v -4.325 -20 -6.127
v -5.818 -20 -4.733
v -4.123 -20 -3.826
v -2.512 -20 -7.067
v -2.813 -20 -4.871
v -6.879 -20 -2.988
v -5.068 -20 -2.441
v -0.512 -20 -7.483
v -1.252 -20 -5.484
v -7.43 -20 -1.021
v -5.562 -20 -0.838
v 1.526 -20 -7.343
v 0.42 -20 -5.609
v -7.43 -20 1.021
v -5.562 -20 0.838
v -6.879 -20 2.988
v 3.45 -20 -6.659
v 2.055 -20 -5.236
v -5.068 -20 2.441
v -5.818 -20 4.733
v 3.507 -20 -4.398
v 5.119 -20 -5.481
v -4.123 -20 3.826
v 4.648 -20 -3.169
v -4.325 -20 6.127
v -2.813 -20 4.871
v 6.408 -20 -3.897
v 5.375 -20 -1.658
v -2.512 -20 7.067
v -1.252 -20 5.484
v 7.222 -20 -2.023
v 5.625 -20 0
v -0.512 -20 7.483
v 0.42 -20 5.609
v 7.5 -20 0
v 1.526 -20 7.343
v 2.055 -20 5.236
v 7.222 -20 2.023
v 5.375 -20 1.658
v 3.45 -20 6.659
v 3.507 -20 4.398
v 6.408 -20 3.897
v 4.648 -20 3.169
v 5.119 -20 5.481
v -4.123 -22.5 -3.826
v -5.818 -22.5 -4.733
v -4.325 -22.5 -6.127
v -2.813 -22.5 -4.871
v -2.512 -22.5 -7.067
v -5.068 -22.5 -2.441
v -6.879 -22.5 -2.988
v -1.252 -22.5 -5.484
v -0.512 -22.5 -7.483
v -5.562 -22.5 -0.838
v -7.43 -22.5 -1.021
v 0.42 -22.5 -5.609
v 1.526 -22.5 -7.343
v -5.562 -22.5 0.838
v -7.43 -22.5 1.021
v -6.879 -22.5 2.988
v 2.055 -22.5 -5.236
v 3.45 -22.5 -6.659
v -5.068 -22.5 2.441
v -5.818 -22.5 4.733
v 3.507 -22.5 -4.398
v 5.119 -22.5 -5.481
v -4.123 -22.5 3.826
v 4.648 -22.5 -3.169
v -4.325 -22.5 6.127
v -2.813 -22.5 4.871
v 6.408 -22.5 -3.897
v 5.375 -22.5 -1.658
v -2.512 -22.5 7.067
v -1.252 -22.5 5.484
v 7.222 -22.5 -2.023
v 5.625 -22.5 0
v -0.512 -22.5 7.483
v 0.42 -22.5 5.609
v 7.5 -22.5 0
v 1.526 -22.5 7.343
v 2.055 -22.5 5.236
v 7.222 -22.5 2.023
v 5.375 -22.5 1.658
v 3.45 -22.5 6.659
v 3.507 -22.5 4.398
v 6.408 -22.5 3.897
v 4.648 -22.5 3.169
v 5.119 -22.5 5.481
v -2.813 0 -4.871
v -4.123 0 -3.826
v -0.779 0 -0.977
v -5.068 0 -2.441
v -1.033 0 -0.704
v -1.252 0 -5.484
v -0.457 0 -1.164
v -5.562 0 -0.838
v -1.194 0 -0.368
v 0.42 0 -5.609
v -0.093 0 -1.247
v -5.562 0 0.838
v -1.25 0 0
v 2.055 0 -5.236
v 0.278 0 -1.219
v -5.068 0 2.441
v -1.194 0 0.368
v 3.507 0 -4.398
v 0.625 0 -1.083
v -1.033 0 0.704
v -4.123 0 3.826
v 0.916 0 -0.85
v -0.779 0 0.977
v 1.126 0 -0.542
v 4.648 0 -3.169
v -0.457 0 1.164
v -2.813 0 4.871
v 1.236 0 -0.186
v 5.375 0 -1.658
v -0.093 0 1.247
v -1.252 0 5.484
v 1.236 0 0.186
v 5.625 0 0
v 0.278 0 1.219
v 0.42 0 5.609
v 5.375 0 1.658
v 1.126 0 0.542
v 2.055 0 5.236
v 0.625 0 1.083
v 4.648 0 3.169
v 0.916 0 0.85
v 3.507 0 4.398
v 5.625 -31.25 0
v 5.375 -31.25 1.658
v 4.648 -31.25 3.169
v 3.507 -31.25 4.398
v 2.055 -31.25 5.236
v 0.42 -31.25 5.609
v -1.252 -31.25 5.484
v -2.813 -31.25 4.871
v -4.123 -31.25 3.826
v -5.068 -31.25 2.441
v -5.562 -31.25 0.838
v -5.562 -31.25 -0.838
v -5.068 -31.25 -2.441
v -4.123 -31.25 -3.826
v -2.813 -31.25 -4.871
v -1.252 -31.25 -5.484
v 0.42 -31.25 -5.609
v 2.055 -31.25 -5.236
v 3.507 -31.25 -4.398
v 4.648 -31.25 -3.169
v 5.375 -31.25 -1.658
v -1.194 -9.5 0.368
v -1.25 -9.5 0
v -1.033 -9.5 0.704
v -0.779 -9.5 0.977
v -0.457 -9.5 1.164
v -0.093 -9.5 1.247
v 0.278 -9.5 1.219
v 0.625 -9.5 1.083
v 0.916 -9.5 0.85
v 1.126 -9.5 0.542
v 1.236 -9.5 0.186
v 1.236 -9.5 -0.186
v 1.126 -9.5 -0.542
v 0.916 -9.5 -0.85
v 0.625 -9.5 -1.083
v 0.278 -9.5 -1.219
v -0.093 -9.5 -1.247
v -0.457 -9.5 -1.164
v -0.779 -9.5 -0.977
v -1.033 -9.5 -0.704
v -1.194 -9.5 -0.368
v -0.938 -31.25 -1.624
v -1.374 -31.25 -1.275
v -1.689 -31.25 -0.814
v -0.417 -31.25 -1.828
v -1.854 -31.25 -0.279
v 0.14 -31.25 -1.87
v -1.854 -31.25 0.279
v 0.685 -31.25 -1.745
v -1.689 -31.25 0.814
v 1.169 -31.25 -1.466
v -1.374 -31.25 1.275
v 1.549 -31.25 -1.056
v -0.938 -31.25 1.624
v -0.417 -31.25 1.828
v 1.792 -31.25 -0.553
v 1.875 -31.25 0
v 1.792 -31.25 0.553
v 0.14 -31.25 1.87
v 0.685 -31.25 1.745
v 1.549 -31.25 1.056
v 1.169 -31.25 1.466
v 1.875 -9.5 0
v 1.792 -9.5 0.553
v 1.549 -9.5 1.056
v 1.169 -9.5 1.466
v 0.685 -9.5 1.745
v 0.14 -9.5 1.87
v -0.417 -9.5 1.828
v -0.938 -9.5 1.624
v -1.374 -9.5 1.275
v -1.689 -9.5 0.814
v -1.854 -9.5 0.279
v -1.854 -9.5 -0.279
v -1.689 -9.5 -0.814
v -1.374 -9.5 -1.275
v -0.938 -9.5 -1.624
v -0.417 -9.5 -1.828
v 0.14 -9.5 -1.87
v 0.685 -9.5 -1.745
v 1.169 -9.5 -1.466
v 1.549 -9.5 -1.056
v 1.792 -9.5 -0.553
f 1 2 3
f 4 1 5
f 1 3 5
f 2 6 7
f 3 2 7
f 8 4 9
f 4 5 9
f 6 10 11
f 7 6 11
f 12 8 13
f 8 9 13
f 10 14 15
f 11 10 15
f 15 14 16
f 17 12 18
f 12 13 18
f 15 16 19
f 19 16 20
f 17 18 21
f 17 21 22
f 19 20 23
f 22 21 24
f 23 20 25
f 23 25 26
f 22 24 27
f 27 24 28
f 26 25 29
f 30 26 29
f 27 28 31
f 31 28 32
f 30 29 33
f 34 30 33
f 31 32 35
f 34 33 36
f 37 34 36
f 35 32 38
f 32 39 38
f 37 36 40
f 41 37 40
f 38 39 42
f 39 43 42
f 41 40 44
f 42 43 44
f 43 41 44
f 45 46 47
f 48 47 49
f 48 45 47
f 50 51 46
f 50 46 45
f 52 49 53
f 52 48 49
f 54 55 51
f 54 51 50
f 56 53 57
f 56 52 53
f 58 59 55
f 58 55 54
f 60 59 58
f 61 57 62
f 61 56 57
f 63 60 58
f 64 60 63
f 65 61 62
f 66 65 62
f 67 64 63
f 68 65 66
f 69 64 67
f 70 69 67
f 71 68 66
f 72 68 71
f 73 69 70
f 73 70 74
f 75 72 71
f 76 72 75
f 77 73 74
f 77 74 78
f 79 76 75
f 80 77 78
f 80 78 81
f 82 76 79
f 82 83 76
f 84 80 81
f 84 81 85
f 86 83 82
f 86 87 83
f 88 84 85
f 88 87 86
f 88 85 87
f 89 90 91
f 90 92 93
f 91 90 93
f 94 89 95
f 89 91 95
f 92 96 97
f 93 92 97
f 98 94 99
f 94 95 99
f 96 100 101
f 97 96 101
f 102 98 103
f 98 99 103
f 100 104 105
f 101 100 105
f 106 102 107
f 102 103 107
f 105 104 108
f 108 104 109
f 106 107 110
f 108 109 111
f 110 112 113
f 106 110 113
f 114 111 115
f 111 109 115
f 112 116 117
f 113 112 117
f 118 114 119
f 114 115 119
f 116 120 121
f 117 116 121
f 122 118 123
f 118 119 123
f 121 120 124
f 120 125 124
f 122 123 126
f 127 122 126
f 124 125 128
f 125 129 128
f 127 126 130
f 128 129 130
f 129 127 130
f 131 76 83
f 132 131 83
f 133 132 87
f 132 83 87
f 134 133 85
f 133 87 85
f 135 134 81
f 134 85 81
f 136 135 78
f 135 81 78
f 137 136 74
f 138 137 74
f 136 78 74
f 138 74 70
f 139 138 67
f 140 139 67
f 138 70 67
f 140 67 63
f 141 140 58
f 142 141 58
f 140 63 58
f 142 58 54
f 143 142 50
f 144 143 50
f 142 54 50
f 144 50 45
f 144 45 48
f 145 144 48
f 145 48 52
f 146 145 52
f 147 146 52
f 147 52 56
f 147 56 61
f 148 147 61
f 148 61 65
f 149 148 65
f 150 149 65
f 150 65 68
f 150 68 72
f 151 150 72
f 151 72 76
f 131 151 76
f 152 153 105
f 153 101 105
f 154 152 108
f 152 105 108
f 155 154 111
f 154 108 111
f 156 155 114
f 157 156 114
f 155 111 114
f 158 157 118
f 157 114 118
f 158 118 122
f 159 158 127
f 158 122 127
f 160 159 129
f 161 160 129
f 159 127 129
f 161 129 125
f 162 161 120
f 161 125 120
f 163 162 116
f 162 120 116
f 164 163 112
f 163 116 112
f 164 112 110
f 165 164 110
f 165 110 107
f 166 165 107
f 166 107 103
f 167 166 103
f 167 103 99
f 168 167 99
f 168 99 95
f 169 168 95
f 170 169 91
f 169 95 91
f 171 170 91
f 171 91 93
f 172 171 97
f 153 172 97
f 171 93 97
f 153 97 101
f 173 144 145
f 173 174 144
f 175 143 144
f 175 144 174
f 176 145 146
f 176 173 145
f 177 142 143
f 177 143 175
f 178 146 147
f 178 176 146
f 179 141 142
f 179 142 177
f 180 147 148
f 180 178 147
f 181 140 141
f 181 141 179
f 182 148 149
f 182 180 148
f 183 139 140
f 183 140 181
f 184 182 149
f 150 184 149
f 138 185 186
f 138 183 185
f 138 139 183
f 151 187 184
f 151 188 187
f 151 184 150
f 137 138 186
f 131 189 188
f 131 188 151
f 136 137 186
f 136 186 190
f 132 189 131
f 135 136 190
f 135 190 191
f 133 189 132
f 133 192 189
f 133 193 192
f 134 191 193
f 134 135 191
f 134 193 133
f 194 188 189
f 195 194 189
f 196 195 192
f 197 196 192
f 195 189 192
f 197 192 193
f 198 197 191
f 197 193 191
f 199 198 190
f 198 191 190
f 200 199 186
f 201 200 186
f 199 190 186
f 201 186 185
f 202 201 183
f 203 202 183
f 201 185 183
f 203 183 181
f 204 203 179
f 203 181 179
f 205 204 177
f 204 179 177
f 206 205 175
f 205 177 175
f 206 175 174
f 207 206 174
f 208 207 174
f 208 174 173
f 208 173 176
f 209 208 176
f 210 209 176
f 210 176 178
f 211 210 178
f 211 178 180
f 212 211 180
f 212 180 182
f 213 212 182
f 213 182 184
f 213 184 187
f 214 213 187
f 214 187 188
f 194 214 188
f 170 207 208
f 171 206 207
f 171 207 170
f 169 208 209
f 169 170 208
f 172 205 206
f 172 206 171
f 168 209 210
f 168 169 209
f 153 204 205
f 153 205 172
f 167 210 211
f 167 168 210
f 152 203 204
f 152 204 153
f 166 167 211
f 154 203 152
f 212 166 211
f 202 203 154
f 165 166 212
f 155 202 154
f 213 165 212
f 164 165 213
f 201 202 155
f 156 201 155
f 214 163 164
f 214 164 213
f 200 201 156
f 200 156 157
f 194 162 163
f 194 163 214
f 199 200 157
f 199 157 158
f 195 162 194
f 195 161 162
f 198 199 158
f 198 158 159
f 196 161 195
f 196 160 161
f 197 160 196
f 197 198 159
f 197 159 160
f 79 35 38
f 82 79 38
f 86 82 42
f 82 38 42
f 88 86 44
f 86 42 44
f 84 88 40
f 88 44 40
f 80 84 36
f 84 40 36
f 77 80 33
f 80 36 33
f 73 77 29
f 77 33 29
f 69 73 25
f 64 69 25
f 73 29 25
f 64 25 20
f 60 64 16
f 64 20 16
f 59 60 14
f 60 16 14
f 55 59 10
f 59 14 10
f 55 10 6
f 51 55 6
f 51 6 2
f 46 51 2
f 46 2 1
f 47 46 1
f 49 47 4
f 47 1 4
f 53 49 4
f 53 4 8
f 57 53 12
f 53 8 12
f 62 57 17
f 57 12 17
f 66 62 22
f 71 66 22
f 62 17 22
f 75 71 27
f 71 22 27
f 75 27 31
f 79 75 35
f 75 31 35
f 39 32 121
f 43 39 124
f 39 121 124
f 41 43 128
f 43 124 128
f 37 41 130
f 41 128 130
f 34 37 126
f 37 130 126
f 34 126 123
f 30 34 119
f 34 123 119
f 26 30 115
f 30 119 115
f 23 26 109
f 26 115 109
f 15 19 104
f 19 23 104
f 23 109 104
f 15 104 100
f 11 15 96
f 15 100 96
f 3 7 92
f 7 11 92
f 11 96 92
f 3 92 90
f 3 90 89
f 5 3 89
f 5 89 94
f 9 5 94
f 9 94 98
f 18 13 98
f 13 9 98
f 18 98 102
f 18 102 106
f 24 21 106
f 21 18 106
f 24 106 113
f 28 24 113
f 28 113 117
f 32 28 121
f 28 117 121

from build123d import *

# Parameters (mm, degrees)
F0_R           = 5.625
F1_DEPTH       = 31.25
F3_R           = 7.5
F4_DEPTH       = 2.5
F6_D           = 2.5
F6_DEPTH       = 40
F6_CBORE_D     = 3.75
F6_CBORE_DEPTH = 21.75


with BuildPart() as f1:
    # F0 (on Front) → F1 (new body)
    with BuildSketch(Plane.XZ):
        Circle(F0_R)
    extrude(amount=F1_DEPTH)

    # F3 (on offset) → F4 (join)
    with BuildSketch(Plane.XZ.offset(20)):
        Circle(F3_R)
    extrude(amount=F4_DEPTH)

    # F6
    with Locations(Plane.XZ.offset(31.25)):
        with Locations((0, 0)):
            CounterBoreHole(F6_D / 2, F6_CBORE_D / 2, F6_CBORE_DEPTH, depth=F6_DEPTH)


solid = f1.part
